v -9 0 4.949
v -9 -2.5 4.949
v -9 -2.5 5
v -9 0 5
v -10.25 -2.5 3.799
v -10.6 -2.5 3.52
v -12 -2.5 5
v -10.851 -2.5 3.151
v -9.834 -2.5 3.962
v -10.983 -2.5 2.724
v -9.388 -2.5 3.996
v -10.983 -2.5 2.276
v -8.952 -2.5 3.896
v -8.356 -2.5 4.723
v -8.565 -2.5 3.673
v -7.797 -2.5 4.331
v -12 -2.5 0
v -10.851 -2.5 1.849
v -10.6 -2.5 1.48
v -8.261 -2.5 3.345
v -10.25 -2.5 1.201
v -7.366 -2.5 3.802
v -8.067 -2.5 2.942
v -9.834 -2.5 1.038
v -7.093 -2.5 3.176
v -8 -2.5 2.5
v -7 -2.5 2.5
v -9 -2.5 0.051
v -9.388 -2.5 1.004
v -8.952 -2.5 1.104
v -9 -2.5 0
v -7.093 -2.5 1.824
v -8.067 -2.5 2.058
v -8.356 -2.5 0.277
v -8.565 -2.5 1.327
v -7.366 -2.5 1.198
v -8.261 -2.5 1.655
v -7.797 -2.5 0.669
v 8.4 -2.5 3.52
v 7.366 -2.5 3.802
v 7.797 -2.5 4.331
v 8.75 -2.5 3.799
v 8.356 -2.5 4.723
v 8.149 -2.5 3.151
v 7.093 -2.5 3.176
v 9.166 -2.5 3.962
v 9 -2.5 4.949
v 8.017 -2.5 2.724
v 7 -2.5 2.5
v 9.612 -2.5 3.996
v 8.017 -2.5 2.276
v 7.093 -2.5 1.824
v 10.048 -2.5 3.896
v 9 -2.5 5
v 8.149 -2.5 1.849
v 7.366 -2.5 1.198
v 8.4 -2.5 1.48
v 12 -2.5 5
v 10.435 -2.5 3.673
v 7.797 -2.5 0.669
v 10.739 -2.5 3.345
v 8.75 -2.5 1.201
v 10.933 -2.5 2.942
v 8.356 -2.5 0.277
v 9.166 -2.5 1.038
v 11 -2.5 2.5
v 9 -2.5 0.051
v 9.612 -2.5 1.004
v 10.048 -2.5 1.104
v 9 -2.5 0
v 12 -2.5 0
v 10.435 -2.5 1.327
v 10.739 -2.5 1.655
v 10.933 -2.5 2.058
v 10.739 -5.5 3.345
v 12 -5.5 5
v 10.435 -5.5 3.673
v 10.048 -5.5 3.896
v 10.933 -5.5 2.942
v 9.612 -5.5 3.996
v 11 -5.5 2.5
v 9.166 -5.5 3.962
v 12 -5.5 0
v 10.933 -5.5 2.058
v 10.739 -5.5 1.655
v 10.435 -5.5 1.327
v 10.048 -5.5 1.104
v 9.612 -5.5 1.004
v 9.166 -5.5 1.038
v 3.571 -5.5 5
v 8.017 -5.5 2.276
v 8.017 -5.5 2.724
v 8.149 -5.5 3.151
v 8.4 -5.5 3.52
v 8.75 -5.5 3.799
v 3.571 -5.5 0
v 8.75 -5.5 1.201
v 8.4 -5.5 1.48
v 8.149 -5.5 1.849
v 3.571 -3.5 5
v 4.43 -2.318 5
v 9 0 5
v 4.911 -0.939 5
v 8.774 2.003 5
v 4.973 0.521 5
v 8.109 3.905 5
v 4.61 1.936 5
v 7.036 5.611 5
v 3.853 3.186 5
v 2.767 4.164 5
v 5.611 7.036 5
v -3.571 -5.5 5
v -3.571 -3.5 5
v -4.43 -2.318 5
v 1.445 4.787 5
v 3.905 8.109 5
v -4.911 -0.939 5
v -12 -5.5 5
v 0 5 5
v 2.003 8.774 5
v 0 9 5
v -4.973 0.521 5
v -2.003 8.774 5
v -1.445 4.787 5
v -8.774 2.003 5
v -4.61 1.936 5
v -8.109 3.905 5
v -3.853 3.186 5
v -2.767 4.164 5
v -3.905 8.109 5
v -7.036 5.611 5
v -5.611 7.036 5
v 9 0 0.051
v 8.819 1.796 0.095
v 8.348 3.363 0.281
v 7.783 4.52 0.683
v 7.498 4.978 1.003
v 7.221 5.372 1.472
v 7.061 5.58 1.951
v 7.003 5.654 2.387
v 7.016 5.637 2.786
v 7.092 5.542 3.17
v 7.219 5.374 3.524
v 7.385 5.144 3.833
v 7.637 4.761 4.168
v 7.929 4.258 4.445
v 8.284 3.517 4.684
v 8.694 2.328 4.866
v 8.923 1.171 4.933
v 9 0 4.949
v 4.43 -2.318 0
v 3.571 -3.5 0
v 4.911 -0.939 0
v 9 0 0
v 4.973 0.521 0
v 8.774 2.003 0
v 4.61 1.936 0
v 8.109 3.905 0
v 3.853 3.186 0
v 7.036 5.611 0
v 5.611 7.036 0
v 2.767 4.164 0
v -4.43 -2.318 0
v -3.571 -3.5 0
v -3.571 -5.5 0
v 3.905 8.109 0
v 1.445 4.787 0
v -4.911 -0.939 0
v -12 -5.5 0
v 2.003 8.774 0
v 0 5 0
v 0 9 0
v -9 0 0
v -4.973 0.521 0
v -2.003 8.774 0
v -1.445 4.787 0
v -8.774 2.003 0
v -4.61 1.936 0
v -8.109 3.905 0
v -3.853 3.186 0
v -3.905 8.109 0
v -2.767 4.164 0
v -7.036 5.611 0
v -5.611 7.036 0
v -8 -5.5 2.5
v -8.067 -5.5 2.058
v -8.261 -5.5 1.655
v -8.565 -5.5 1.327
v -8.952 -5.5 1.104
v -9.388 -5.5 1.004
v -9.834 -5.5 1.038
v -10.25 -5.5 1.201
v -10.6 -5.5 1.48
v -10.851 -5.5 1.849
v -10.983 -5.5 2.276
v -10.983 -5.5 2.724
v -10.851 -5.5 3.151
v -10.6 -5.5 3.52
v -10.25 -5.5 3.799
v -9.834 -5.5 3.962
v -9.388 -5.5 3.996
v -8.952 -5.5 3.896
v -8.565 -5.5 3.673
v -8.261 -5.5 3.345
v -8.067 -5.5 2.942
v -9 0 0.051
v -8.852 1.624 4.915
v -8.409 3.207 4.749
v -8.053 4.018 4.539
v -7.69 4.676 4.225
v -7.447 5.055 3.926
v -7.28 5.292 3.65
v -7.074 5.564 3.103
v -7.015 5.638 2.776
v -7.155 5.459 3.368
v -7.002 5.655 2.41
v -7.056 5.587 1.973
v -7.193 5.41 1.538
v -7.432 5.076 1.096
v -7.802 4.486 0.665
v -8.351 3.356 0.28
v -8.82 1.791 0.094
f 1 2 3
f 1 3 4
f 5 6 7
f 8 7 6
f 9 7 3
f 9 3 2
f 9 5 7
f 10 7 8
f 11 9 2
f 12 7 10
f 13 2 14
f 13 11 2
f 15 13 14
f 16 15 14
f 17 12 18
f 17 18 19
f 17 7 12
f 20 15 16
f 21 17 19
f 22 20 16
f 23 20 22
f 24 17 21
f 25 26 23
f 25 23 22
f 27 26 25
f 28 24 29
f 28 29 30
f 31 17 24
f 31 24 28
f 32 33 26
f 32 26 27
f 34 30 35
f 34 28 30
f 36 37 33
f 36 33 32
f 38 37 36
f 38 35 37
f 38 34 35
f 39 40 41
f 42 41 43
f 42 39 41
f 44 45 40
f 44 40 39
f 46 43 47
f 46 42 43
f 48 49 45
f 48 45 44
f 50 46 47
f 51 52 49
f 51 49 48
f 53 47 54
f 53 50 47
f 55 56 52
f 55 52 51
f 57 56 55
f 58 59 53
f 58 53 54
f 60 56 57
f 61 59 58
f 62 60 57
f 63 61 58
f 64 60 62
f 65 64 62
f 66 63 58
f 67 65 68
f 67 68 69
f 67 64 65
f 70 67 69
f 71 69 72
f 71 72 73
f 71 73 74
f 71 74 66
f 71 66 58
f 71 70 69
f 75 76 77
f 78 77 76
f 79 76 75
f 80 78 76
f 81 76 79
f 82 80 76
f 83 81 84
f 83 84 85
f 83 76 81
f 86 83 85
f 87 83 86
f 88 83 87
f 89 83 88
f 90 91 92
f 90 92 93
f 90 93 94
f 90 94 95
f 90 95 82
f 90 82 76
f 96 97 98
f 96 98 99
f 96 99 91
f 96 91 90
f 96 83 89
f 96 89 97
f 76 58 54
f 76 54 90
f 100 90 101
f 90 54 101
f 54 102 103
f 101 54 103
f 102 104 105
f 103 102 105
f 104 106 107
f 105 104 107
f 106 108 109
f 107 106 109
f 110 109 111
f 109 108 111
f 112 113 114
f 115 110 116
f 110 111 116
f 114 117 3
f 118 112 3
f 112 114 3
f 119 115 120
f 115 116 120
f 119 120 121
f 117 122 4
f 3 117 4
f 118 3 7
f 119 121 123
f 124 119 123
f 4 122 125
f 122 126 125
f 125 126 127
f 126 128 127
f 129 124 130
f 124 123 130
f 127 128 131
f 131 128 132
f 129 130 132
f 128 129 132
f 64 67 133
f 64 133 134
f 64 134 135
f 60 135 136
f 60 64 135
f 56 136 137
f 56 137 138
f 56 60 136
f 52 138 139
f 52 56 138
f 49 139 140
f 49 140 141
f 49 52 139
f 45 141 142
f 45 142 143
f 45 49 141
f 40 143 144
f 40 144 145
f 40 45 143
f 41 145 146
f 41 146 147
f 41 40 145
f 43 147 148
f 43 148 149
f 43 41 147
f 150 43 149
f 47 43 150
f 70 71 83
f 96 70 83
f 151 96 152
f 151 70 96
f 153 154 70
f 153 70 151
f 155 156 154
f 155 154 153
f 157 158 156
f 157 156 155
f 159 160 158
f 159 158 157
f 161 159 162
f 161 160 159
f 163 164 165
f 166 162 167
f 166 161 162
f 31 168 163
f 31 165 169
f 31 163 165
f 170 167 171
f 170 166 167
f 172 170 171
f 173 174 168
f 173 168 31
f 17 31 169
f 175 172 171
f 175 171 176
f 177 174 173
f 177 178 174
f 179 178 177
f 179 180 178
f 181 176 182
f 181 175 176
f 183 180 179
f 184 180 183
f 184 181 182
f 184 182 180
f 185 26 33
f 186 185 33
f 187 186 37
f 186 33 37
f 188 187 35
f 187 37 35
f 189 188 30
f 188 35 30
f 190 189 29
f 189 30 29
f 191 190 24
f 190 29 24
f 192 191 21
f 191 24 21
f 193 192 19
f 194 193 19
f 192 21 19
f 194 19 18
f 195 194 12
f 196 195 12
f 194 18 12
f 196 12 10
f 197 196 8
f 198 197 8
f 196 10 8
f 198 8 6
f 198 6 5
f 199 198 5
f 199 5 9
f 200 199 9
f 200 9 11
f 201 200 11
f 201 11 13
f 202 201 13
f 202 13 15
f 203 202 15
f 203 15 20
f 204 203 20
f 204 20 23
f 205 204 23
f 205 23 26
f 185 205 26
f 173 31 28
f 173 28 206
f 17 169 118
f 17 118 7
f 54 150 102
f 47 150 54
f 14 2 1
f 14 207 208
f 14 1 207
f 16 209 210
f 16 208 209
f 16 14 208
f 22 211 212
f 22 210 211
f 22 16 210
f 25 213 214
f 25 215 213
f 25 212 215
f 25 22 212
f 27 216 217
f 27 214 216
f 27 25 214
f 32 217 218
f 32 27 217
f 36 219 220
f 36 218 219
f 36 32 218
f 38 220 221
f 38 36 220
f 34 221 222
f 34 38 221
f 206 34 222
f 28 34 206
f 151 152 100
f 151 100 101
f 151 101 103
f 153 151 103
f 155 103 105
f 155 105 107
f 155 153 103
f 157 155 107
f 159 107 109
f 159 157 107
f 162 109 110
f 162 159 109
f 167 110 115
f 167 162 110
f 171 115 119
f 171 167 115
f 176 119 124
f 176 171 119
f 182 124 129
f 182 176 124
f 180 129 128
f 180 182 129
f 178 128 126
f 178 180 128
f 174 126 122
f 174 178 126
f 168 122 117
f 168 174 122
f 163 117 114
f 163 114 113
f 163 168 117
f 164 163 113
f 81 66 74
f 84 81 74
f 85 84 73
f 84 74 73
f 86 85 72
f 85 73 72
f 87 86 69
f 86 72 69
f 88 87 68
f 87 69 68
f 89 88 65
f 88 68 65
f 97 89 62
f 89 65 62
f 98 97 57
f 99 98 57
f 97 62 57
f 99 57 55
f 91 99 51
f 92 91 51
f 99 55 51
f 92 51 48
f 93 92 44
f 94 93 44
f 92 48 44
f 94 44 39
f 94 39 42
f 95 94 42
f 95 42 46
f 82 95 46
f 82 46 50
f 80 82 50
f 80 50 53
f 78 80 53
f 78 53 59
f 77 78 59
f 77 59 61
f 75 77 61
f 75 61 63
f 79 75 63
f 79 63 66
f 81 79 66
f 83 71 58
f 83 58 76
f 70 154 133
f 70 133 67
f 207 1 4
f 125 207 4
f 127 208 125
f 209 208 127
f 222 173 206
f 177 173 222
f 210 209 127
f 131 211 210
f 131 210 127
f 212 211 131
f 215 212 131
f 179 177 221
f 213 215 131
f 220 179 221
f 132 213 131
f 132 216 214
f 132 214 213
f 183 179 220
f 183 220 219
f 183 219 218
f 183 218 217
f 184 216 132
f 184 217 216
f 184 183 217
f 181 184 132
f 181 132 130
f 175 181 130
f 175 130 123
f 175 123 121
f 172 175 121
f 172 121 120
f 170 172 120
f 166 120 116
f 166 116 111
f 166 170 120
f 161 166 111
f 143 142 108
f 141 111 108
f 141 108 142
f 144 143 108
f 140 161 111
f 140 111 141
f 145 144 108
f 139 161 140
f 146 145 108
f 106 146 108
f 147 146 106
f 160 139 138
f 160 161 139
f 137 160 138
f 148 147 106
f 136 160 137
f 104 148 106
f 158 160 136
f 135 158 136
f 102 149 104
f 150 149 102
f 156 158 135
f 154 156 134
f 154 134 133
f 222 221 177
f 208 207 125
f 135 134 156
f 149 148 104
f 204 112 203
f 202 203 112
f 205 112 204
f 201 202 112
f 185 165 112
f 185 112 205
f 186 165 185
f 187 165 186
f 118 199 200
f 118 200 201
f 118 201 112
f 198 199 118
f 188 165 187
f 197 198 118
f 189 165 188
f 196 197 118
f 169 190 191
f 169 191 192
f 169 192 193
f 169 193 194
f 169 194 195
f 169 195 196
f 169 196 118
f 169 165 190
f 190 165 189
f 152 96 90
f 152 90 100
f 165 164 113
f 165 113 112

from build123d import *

# Parameters (mm, degrees)
RESSALTO_EXTRUS_O1_DEPTH   = 5
ESBO_O2_R                  = 1.5
CORTE_EXTRUS_O1_DEPTH      = 12.5
CORTE_EXTRUS_O1_DEPTH_BACK = 4
ESBO_O3_R                  = 2.5
CORTE_EXTRUS_O2_DEPTH      = 12.5000001


with BuildPart() as part:
    # Esboço1 → Ressalto-extrusão1 (new body)
    with BuildSketch(Plane.XY):
        with BuildLine():
            Line((-9, -2.5), (-9, 0))
            ThreePointArc((-9, 0), (0, 9), (9, 0))
            Line((9, 0), (9, -2.5))
            Line((9, -2.5), (12, -2.5))
            Line((12, -2.5), (12, -5.5))
            Line((12, -5.5), (3.570714214, -5.5))
            Line((3.570714214, -5.5), (3.570714214, -3.5))
            ThreePointArc((3.570714214, -3.5), (0, 5), (-3.570714214, -3.5))
            Line((-3.570714214, -3.5), (-3.570714214, -5.5))
            Line((-3.570714214, -5.5), (-12, -5.5))
            Line((-12, -5.5), (-12, -2.5))
            Line((-12, -2.5), (-9, -2.5))
        make_face()
    extrude(amount=RESSALTO_EXTRUS_O1_DEPTH)

    # Esboço2 → Corte-extrusão1 (cut, two sides)
    with BuildSketch(Plane(origin=(0, -2.5, 0), x_dir=(1, 0, 0), z_dir=(0, 1, 0))) as corte_extrus_o1_sk:
        with Locations((-9.5, -2.5)):
            Circle(ESBO_O2_R)
        with Locations((9.5, -2.5)):
            Circle(ESBO_O2_R)
    extrude(amount=CORTE_EXTRUS_O1_DEPTH, mode=Mode.SUBTRACT)
    extrude(corte_extrus_o1_sk.sketch, amount=-CORTE_EXTRUS_O1_DEPTH_BACK, mode=Mode.SUBTRACT)

    # Esboço3 → Corte-extrusão2 (cut, through all)
    with BuildSketch(Plane(origin=(0, -2.5, 0), x_dir=(1, 0, 0), z_dir=(0, 1, 0))):
        with Locations((-9.5, -2.5)):
            Circle(ESBO_O3_R)
        with Locations((9.5, -2.5)):
            Circle(ESBO_O3_R)
    extrude(amount=CORTE_EXTRUS_O2_DEPTH, mode=Mode.SUBTRACT)


solid = part.part
